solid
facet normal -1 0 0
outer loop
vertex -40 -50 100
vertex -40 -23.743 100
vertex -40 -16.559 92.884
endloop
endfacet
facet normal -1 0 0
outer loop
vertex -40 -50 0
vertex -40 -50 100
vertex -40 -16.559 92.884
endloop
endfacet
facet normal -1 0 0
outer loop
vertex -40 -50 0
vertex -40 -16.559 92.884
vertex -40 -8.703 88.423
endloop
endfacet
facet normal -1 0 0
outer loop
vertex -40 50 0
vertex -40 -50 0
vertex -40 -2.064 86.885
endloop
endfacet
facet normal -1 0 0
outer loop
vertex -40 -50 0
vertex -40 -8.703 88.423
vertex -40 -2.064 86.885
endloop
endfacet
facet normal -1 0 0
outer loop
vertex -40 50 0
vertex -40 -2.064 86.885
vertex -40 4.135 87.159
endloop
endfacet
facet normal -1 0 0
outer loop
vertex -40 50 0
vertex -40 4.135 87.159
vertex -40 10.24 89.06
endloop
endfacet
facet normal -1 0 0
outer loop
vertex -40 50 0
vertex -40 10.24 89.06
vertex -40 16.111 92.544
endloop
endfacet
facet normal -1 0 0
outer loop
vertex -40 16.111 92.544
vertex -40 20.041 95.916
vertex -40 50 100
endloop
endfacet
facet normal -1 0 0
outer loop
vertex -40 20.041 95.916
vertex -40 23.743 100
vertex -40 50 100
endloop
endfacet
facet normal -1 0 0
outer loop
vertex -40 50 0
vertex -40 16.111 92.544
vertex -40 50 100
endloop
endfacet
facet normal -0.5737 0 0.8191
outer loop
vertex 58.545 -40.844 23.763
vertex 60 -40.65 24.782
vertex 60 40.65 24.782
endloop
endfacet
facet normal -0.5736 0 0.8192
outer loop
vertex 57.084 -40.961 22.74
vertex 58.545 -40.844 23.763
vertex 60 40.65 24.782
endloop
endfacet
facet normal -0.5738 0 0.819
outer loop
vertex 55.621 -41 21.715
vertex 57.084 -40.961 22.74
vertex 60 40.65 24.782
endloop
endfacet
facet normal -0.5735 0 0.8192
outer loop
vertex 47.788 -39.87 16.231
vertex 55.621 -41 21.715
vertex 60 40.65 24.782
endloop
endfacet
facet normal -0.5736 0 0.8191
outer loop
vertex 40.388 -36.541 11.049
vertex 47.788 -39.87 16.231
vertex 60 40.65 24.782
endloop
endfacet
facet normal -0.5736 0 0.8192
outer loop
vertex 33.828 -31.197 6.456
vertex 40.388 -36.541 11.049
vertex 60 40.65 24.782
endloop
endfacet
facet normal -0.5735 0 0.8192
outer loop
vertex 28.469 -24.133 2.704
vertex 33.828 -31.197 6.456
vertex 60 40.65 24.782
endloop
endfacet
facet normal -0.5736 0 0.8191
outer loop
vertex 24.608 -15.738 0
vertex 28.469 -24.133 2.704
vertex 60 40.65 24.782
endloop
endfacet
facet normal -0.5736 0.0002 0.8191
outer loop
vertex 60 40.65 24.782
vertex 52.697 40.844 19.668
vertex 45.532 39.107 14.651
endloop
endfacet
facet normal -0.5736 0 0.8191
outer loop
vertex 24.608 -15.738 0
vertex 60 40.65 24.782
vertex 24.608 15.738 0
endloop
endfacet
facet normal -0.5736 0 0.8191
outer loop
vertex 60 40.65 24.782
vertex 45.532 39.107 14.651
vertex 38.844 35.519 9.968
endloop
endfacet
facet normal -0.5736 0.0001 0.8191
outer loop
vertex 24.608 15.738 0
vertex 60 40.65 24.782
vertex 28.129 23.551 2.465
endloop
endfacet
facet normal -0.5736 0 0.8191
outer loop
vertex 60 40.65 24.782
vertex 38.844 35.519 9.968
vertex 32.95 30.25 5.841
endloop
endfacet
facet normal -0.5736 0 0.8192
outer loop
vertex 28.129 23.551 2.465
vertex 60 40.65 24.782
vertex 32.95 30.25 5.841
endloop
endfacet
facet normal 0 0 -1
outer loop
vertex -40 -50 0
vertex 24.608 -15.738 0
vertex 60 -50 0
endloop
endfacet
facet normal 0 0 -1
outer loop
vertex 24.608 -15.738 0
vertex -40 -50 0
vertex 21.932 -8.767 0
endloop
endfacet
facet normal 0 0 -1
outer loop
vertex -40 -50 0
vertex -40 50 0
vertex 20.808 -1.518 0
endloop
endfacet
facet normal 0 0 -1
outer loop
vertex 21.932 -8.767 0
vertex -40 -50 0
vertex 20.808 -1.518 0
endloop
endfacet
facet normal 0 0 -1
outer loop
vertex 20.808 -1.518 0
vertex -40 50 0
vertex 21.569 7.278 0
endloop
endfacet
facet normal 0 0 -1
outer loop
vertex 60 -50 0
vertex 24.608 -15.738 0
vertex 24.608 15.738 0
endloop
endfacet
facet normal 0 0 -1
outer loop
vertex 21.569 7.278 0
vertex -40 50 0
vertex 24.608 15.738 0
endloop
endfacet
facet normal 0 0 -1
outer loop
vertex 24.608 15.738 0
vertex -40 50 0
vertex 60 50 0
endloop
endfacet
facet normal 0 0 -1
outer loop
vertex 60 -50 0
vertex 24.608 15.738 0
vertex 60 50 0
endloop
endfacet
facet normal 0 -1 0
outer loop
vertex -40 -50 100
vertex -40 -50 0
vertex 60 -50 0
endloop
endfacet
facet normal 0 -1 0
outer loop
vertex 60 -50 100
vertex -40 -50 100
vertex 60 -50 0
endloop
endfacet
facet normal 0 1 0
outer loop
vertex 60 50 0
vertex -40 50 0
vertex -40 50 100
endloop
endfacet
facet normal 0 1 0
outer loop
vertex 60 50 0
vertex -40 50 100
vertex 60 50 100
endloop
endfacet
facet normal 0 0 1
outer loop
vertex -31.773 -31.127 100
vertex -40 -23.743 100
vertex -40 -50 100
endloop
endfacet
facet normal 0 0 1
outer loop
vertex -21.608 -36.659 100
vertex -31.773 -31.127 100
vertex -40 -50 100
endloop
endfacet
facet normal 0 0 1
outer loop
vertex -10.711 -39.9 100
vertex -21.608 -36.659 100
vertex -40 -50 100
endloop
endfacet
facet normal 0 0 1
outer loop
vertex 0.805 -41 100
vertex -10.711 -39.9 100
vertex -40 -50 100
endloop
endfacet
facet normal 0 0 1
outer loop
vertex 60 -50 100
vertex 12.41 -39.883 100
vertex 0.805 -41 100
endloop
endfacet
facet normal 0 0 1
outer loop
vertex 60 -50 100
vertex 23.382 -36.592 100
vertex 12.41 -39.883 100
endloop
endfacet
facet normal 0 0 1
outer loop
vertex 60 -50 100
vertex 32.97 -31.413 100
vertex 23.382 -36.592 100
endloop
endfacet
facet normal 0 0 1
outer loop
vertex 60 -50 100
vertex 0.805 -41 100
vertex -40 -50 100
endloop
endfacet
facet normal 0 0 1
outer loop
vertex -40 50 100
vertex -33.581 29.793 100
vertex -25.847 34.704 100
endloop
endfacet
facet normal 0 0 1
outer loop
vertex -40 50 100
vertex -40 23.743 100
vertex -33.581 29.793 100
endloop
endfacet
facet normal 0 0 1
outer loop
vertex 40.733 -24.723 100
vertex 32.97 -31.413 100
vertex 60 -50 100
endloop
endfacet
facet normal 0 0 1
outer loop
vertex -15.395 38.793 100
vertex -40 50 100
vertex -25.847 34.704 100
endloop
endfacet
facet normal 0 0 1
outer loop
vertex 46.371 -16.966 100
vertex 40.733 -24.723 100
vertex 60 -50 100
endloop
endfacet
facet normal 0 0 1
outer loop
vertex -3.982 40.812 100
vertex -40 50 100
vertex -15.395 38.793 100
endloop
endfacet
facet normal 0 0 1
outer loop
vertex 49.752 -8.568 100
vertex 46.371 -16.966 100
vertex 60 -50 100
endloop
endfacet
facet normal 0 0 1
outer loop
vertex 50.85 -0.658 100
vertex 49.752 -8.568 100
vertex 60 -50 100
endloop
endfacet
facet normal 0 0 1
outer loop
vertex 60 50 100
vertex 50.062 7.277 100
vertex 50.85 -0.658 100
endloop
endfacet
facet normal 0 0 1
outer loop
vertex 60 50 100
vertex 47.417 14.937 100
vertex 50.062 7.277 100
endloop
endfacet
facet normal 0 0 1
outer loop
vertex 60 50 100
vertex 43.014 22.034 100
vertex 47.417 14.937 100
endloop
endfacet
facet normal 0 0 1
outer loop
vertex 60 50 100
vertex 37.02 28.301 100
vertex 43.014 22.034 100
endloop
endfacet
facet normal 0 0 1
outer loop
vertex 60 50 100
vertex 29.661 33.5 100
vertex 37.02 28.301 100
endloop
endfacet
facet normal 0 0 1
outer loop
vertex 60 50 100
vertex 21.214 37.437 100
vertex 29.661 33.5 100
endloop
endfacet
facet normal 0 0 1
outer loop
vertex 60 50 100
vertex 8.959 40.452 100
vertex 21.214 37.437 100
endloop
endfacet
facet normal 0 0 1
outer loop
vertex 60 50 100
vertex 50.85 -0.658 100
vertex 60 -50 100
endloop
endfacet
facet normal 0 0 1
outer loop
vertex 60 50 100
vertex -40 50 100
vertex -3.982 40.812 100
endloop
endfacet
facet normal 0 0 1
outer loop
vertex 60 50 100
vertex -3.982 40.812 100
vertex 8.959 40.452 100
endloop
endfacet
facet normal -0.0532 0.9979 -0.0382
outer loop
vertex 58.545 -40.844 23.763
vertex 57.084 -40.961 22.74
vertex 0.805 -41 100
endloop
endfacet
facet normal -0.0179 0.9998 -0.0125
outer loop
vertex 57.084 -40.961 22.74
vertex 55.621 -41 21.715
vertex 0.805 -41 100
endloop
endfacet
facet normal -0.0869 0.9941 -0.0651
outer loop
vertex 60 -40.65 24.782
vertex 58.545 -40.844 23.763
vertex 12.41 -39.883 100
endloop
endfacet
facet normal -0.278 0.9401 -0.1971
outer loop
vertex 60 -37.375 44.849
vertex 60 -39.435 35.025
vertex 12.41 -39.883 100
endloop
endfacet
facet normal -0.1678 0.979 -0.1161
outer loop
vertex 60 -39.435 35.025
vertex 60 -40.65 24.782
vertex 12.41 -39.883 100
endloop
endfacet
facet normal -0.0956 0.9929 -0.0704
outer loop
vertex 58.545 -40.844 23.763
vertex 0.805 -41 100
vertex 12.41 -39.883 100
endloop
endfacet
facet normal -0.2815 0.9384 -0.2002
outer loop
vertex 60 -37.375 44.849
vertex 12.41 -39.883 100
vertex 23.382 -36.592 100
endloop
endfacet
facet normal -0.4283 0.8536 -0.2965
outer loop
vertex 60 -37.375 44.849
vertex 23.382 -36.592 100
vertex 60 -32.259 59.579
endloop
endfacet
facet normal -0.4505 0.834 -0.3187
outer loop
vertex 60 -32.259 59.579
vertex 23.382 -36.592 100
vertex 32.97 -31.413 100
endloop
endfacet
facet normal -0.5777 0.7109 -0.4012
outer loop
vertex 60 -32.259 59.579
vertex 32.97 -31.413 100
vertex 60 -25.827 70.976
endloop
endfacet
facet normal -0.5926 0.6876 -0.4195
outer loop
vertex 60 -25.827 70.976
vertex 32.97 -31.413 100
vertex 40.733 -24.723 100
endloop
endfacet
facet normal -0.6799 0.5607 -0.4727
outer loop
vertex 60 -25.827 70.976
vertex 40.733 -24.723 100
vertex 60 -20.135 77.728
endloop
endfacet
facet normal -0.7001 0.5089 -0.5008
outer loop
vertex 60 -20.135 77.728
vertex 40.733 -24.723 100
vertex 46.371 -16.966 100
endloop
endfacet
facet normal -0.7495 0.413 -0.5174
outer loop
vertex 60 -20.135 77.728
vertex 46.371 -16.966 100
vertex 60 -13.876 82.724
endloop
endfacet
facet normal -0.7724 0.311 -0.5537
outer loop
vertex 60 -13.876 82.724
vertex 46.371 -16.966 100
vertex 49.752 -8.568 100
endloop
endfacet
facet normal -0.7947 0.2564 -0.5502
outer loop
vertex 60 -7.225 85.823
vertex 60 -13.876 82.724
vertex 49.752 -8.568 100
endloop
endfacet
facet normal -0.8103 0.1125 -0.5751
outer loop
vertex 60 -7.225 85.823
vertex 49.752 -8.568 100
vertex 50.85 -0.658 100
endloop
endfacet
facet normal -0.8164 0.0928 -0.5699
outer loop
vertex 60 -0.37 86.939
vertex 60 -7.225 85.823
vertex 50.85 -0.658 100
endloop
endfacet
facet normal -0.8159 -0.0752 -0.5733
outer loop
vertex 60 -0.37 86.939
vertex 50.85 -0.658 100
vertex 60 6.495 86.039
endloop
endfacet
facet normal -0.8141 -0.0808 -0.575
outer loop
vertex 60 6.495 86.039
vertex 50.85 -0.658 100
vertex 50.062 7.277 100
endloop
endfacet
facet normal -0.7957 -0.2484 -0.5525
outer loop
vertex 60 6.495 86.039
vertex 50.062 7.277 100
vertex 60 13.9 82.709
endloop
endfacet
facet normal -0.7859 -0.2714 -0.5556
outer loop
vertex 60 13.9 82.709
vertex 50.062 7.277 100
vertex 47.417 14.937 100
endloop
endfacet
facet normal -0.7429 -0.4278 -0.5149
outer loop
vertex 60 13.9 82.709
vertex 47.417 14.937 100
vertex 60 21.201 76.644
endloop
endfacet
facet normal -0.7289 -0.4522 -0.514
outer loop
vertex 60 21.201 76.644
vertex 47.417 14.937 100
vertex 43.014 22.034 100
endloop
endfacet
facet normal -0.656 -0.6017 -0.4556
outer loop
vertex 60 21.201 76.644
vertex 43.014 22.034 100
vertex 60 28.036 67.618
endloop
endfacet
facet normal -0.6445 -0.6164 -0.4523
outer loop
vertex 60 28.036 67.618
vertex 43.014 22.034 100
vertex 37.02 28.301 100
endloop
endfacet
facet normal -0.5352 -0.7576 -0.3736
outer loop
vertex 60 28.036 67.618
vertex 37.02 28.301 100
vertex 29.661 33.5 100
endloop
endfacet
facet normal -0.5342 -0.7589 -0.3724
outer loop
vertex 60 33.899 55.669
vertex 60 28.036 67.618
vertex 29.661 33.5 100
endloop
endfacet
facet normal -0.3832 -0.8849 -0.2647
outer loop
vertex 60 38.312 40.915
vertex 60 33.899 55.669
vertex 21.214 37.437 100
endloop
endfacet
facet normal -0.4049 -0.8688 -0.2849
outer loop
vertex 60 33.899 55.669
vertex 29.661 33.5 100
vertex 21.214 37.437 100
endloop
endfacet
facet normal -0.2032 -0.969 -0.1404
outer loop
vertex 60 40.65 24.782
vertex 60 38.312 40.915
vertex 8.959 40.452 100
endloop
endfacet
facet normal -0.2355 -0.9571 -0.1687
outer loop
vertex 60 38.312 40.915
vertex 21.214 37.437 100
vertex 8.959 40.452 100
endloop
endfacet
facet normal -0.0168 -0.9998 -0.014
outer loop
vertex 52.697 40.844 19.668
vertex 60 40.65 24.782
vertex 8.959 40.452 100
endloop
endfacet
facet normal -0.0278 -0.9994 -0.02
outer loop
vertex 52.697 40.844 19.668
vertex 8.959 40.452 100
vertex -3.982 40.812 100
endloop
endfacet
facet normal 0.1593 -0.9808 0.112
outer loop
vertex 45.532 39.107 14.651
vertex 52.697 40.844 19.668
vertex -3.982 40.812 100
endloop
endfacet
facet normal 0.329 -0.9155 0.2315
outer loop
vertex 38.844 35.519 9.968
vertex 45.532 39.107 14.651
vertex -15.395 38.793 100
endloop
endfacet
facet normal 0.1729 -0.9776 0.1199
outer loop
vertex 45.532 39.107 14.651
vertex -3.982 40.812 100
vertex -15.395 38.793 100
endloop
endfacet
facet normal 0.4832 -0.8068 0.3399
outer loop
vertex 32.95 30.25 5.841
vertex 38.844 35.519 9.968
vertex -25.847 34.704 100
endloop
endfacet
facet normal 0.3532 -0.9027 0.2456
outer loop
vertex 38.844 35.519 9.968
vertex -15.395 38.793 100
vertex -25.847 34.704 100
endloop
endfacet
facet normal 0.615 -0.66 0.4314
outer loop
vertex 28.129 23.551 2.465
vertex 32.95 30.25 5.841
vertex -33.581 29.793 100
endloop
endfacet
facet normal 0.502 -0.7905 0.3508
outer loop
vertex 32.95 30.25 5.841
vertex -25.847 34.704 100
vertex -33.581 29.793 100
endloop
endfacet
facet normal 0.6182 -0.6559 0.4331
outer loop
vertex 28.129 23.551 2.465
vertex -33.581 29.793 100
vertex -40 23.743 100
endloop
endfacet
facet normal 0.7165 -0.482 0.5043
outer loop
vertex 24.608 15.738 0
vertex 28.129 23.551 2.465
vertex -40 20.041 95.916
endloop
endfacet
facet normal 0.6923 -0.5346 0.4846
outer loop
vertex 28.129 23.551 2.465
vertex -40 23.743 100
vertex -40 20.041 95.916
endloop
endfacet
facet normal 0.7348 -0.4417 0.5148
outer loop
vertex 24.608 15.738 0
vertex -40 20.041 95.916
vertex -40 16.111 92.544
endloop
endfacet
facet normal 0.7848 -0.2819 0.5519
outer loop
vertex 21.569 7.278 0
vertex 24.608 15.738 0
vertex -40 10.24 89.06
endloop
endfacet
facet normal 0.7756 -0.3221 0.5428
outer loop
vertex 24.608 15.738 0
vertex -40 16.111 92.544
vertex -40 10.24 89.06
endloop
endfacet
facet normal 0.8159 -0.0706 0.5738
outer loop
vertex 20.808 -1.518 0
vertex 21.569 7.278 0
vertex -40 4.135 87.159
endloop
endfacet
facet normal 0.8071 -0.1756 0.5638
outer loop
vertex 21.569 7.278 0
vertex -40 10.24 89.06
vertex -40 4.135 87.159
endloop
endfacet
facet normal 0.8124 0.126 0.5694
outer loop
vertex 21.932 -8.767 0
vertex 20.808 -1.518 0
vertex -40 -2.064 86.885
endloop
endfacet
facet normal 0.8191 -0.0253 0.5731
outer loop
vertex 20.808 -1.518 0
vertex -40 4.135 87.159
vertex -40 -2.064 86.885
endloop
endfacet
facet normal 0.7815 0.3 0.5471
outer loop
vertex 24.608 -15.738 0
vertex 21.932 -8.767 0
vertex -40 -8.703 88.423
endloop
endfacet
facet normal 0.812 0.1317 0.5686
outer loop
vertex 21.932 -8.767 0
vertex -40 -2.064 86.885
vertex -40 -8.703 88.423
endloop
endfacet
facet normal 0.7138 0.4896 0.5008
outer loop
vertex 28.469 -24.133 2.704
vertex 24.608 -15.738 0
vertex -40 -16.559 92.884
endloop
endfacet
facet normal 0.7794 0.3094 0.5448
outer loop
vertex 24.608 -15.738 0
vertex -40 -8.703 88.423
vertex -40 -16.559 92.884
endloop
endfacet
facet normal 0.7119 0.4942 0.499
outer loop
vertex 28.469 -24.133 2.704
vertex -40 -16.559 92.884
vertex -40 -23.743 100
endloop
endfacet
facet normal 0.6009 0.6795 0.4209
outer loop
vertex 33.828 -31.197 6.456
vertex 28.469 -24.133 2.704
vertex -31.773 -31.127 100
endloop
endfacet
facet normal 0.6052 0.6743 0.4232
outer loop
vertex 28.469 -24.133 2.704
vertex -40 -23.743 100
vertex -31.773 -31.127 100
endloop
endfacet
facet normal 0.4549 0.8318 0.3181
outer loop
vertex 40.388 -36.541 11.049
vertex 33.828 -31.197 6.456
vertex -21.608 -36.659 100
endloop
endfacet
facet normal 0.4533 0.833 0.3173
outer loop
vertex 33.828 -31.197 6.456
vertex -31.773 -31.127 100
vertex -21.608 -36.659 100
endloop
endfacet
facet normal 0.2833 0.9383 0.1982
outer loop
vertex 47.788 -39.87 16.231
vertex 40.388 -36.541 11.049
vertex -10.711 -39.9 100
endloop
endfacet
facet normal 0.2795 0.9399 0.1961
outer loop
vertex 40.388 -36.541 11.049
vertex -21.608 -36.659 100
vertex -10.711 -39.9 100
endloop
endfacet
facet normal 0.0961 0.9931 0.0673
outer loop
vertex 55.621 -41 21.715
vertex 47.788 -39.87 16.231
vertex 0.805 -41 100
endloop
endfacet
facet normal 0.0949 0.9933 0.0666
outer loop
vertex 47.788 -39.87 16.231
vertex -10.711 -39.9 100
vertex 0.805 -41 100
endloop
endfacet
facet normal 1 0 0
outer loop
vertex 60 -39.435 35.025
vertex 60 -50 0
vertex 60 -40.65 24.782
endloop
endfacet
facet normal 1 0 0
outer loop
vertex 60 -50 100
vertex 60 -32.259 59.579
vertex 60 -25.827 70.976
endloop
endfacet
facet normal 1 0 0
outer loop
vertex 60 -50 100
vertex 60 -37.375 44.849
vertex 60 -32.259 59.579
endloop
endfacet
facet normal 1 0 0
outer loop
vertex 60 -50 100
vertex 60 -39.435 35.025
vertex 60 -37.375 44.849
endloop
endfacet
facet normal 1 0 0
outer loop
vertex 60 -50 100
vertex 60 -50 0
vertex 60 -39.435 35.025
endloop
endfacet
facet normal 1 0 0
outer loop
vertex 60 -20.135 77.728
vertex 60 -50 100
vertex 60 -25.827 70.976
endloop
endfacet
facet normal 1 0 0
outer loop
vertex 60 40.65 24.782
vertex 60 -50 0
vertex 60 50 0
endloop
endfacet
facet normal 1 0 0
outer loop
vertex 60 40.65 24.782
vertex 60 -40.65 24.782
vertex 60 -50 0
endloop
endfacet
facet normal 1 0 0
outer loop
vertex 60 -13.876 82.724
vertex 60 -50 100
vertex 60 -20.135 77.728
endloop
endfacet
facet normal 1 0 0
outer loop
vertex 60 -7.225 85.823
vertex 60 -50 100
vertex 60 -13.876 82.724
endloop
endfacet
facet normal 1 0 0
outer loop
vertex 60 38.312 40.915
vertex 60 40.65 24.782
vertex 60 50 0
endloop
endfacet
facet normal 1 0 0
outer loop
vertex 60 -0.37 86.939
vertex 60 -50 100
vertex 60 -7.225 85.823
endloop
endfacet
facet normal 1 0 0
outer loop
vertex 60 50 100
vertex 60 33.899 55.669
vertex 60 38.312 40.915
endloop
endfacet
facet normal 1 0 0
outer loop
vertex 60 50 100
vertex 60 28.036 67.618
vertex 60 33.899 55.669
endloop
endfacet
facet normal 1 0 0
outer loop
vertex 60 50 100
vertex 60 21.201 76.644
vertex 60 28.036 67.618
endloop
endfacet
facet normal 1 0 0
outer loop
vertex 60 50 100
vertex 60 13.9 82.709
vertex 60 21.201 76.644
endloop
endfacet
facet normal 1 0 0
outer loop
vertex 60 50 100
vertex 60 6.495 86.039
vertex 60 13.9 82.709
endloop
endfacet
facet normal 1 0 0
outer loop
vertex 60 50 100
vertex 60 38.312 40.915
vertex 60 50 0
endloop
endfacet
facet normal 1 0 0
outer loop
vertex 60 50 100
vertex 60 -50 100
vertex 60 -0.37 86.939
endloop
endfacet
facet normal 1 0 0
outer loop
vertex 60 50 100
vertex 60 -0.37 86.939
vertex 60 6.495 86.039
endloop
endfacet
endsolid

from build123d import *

# Parameters (mm, degrees)
SKETCH1_W           = 140
SKETCH1_H           = 100
BOSS_EXTRUDE1_DEPTH = 100
SKETCH2_R           = 41
CUT_EXTRUDE1_DEPTH  = 163.215905518
SKETCH3_W           = 20
SKETCH3_H           = 100
CUT_EXTRUDE2_DEPTH  = 101
SKETCH4_W           = 10
SKETCH4_H           = 100
CUT_EXTRUDE3_DEPTH  = 101
SKETCH5_R           = 41
BOSS_EXTRUDE2_DEPTH = 20.3
CUT_EXTRUDE4_DEPTH  = 101


with BuildPart() as part:
    # Sketch1 → Boss-Extrude1 (new body)
    with BuildSketch(Plane.XY):
        Rectangle(SKETCH1_W, SKETCH1_H)
    extrude(amount=BOSS_EXTRUDE1_DEPTH)

    # Sketch2 → Cut-Extrude1 (cut, through all)
    with BuildSketch(Plane(origin=(-70.013926023, 0, 99.990248894), x_dir=(0, -1, 0), z_dir=(-0.573576436, 0, 0.819152044))):
        with Locations((0, 58.017000535)):
            Circle(SKETCH2_R)
    extrude(amount=-CUT_EXTRUDE1_DEPTH, mode=Mode.SUBTRACT)

    # Sketch3 → Cut-Extrude2 (cut, through all)
    with BuildSketch(Plane.XY.offset(100)):
        with Locations((-60, 0)):
            Rectangle(SKETCH3_W, SKETCH3_H)
    extrude(amount=-CUT_EXTRUDE2_DEPTH, mode=Mode.SUBTRACT)

    # Sketch4 → Cut-Extrude3 (cut, through all)
    with BuildSketch(Plane.XY.offset(100)):
        with Locations((-45, 0)):
            Rectangle(SKETCH4_W, SKETCH4_H)
        with Locations((65, 0)):
            Rectangle(SKETCH4_W, SKETCH4_H)
    extrude(amount=-CUT_EXTRUDE3_DEPTH, mode=Mode.SUBTRACT)

    # Sketch5 → Boss-Extrude2 (add)
    with BuildSketch(Plane(origin=(19.7393957, 0, -28.190778624), x_dir=(-0.819152044, 0, -0.573576436), z_dir=(0.573576436, 0, -0.819152044))):
        with Locations((-58.017000535, 0)):
            Circle(SKETCH5_R)
    extrude(amount=-BOSS_EXTRUDE2_DEPTH)

    # Sketch6 → Cut-Extrude4 (cut, through all)
    with BuildSketch(Plane(origin=(0, 50, 0), x_dir=(1, 0, 0), z_dir=(0, 1, 0))):
        Polygon((60, 0), (-40, 0), (-40, 38.622200476), (122.468168518, 38.622200476), (119.926290674, -91.2591408), (60, -91.2591408), align=None)
    extrude(amount=-CUT_EXTRUDE4_DEPTH, mode=Mode.SUBTRACT)


solid = part.part
